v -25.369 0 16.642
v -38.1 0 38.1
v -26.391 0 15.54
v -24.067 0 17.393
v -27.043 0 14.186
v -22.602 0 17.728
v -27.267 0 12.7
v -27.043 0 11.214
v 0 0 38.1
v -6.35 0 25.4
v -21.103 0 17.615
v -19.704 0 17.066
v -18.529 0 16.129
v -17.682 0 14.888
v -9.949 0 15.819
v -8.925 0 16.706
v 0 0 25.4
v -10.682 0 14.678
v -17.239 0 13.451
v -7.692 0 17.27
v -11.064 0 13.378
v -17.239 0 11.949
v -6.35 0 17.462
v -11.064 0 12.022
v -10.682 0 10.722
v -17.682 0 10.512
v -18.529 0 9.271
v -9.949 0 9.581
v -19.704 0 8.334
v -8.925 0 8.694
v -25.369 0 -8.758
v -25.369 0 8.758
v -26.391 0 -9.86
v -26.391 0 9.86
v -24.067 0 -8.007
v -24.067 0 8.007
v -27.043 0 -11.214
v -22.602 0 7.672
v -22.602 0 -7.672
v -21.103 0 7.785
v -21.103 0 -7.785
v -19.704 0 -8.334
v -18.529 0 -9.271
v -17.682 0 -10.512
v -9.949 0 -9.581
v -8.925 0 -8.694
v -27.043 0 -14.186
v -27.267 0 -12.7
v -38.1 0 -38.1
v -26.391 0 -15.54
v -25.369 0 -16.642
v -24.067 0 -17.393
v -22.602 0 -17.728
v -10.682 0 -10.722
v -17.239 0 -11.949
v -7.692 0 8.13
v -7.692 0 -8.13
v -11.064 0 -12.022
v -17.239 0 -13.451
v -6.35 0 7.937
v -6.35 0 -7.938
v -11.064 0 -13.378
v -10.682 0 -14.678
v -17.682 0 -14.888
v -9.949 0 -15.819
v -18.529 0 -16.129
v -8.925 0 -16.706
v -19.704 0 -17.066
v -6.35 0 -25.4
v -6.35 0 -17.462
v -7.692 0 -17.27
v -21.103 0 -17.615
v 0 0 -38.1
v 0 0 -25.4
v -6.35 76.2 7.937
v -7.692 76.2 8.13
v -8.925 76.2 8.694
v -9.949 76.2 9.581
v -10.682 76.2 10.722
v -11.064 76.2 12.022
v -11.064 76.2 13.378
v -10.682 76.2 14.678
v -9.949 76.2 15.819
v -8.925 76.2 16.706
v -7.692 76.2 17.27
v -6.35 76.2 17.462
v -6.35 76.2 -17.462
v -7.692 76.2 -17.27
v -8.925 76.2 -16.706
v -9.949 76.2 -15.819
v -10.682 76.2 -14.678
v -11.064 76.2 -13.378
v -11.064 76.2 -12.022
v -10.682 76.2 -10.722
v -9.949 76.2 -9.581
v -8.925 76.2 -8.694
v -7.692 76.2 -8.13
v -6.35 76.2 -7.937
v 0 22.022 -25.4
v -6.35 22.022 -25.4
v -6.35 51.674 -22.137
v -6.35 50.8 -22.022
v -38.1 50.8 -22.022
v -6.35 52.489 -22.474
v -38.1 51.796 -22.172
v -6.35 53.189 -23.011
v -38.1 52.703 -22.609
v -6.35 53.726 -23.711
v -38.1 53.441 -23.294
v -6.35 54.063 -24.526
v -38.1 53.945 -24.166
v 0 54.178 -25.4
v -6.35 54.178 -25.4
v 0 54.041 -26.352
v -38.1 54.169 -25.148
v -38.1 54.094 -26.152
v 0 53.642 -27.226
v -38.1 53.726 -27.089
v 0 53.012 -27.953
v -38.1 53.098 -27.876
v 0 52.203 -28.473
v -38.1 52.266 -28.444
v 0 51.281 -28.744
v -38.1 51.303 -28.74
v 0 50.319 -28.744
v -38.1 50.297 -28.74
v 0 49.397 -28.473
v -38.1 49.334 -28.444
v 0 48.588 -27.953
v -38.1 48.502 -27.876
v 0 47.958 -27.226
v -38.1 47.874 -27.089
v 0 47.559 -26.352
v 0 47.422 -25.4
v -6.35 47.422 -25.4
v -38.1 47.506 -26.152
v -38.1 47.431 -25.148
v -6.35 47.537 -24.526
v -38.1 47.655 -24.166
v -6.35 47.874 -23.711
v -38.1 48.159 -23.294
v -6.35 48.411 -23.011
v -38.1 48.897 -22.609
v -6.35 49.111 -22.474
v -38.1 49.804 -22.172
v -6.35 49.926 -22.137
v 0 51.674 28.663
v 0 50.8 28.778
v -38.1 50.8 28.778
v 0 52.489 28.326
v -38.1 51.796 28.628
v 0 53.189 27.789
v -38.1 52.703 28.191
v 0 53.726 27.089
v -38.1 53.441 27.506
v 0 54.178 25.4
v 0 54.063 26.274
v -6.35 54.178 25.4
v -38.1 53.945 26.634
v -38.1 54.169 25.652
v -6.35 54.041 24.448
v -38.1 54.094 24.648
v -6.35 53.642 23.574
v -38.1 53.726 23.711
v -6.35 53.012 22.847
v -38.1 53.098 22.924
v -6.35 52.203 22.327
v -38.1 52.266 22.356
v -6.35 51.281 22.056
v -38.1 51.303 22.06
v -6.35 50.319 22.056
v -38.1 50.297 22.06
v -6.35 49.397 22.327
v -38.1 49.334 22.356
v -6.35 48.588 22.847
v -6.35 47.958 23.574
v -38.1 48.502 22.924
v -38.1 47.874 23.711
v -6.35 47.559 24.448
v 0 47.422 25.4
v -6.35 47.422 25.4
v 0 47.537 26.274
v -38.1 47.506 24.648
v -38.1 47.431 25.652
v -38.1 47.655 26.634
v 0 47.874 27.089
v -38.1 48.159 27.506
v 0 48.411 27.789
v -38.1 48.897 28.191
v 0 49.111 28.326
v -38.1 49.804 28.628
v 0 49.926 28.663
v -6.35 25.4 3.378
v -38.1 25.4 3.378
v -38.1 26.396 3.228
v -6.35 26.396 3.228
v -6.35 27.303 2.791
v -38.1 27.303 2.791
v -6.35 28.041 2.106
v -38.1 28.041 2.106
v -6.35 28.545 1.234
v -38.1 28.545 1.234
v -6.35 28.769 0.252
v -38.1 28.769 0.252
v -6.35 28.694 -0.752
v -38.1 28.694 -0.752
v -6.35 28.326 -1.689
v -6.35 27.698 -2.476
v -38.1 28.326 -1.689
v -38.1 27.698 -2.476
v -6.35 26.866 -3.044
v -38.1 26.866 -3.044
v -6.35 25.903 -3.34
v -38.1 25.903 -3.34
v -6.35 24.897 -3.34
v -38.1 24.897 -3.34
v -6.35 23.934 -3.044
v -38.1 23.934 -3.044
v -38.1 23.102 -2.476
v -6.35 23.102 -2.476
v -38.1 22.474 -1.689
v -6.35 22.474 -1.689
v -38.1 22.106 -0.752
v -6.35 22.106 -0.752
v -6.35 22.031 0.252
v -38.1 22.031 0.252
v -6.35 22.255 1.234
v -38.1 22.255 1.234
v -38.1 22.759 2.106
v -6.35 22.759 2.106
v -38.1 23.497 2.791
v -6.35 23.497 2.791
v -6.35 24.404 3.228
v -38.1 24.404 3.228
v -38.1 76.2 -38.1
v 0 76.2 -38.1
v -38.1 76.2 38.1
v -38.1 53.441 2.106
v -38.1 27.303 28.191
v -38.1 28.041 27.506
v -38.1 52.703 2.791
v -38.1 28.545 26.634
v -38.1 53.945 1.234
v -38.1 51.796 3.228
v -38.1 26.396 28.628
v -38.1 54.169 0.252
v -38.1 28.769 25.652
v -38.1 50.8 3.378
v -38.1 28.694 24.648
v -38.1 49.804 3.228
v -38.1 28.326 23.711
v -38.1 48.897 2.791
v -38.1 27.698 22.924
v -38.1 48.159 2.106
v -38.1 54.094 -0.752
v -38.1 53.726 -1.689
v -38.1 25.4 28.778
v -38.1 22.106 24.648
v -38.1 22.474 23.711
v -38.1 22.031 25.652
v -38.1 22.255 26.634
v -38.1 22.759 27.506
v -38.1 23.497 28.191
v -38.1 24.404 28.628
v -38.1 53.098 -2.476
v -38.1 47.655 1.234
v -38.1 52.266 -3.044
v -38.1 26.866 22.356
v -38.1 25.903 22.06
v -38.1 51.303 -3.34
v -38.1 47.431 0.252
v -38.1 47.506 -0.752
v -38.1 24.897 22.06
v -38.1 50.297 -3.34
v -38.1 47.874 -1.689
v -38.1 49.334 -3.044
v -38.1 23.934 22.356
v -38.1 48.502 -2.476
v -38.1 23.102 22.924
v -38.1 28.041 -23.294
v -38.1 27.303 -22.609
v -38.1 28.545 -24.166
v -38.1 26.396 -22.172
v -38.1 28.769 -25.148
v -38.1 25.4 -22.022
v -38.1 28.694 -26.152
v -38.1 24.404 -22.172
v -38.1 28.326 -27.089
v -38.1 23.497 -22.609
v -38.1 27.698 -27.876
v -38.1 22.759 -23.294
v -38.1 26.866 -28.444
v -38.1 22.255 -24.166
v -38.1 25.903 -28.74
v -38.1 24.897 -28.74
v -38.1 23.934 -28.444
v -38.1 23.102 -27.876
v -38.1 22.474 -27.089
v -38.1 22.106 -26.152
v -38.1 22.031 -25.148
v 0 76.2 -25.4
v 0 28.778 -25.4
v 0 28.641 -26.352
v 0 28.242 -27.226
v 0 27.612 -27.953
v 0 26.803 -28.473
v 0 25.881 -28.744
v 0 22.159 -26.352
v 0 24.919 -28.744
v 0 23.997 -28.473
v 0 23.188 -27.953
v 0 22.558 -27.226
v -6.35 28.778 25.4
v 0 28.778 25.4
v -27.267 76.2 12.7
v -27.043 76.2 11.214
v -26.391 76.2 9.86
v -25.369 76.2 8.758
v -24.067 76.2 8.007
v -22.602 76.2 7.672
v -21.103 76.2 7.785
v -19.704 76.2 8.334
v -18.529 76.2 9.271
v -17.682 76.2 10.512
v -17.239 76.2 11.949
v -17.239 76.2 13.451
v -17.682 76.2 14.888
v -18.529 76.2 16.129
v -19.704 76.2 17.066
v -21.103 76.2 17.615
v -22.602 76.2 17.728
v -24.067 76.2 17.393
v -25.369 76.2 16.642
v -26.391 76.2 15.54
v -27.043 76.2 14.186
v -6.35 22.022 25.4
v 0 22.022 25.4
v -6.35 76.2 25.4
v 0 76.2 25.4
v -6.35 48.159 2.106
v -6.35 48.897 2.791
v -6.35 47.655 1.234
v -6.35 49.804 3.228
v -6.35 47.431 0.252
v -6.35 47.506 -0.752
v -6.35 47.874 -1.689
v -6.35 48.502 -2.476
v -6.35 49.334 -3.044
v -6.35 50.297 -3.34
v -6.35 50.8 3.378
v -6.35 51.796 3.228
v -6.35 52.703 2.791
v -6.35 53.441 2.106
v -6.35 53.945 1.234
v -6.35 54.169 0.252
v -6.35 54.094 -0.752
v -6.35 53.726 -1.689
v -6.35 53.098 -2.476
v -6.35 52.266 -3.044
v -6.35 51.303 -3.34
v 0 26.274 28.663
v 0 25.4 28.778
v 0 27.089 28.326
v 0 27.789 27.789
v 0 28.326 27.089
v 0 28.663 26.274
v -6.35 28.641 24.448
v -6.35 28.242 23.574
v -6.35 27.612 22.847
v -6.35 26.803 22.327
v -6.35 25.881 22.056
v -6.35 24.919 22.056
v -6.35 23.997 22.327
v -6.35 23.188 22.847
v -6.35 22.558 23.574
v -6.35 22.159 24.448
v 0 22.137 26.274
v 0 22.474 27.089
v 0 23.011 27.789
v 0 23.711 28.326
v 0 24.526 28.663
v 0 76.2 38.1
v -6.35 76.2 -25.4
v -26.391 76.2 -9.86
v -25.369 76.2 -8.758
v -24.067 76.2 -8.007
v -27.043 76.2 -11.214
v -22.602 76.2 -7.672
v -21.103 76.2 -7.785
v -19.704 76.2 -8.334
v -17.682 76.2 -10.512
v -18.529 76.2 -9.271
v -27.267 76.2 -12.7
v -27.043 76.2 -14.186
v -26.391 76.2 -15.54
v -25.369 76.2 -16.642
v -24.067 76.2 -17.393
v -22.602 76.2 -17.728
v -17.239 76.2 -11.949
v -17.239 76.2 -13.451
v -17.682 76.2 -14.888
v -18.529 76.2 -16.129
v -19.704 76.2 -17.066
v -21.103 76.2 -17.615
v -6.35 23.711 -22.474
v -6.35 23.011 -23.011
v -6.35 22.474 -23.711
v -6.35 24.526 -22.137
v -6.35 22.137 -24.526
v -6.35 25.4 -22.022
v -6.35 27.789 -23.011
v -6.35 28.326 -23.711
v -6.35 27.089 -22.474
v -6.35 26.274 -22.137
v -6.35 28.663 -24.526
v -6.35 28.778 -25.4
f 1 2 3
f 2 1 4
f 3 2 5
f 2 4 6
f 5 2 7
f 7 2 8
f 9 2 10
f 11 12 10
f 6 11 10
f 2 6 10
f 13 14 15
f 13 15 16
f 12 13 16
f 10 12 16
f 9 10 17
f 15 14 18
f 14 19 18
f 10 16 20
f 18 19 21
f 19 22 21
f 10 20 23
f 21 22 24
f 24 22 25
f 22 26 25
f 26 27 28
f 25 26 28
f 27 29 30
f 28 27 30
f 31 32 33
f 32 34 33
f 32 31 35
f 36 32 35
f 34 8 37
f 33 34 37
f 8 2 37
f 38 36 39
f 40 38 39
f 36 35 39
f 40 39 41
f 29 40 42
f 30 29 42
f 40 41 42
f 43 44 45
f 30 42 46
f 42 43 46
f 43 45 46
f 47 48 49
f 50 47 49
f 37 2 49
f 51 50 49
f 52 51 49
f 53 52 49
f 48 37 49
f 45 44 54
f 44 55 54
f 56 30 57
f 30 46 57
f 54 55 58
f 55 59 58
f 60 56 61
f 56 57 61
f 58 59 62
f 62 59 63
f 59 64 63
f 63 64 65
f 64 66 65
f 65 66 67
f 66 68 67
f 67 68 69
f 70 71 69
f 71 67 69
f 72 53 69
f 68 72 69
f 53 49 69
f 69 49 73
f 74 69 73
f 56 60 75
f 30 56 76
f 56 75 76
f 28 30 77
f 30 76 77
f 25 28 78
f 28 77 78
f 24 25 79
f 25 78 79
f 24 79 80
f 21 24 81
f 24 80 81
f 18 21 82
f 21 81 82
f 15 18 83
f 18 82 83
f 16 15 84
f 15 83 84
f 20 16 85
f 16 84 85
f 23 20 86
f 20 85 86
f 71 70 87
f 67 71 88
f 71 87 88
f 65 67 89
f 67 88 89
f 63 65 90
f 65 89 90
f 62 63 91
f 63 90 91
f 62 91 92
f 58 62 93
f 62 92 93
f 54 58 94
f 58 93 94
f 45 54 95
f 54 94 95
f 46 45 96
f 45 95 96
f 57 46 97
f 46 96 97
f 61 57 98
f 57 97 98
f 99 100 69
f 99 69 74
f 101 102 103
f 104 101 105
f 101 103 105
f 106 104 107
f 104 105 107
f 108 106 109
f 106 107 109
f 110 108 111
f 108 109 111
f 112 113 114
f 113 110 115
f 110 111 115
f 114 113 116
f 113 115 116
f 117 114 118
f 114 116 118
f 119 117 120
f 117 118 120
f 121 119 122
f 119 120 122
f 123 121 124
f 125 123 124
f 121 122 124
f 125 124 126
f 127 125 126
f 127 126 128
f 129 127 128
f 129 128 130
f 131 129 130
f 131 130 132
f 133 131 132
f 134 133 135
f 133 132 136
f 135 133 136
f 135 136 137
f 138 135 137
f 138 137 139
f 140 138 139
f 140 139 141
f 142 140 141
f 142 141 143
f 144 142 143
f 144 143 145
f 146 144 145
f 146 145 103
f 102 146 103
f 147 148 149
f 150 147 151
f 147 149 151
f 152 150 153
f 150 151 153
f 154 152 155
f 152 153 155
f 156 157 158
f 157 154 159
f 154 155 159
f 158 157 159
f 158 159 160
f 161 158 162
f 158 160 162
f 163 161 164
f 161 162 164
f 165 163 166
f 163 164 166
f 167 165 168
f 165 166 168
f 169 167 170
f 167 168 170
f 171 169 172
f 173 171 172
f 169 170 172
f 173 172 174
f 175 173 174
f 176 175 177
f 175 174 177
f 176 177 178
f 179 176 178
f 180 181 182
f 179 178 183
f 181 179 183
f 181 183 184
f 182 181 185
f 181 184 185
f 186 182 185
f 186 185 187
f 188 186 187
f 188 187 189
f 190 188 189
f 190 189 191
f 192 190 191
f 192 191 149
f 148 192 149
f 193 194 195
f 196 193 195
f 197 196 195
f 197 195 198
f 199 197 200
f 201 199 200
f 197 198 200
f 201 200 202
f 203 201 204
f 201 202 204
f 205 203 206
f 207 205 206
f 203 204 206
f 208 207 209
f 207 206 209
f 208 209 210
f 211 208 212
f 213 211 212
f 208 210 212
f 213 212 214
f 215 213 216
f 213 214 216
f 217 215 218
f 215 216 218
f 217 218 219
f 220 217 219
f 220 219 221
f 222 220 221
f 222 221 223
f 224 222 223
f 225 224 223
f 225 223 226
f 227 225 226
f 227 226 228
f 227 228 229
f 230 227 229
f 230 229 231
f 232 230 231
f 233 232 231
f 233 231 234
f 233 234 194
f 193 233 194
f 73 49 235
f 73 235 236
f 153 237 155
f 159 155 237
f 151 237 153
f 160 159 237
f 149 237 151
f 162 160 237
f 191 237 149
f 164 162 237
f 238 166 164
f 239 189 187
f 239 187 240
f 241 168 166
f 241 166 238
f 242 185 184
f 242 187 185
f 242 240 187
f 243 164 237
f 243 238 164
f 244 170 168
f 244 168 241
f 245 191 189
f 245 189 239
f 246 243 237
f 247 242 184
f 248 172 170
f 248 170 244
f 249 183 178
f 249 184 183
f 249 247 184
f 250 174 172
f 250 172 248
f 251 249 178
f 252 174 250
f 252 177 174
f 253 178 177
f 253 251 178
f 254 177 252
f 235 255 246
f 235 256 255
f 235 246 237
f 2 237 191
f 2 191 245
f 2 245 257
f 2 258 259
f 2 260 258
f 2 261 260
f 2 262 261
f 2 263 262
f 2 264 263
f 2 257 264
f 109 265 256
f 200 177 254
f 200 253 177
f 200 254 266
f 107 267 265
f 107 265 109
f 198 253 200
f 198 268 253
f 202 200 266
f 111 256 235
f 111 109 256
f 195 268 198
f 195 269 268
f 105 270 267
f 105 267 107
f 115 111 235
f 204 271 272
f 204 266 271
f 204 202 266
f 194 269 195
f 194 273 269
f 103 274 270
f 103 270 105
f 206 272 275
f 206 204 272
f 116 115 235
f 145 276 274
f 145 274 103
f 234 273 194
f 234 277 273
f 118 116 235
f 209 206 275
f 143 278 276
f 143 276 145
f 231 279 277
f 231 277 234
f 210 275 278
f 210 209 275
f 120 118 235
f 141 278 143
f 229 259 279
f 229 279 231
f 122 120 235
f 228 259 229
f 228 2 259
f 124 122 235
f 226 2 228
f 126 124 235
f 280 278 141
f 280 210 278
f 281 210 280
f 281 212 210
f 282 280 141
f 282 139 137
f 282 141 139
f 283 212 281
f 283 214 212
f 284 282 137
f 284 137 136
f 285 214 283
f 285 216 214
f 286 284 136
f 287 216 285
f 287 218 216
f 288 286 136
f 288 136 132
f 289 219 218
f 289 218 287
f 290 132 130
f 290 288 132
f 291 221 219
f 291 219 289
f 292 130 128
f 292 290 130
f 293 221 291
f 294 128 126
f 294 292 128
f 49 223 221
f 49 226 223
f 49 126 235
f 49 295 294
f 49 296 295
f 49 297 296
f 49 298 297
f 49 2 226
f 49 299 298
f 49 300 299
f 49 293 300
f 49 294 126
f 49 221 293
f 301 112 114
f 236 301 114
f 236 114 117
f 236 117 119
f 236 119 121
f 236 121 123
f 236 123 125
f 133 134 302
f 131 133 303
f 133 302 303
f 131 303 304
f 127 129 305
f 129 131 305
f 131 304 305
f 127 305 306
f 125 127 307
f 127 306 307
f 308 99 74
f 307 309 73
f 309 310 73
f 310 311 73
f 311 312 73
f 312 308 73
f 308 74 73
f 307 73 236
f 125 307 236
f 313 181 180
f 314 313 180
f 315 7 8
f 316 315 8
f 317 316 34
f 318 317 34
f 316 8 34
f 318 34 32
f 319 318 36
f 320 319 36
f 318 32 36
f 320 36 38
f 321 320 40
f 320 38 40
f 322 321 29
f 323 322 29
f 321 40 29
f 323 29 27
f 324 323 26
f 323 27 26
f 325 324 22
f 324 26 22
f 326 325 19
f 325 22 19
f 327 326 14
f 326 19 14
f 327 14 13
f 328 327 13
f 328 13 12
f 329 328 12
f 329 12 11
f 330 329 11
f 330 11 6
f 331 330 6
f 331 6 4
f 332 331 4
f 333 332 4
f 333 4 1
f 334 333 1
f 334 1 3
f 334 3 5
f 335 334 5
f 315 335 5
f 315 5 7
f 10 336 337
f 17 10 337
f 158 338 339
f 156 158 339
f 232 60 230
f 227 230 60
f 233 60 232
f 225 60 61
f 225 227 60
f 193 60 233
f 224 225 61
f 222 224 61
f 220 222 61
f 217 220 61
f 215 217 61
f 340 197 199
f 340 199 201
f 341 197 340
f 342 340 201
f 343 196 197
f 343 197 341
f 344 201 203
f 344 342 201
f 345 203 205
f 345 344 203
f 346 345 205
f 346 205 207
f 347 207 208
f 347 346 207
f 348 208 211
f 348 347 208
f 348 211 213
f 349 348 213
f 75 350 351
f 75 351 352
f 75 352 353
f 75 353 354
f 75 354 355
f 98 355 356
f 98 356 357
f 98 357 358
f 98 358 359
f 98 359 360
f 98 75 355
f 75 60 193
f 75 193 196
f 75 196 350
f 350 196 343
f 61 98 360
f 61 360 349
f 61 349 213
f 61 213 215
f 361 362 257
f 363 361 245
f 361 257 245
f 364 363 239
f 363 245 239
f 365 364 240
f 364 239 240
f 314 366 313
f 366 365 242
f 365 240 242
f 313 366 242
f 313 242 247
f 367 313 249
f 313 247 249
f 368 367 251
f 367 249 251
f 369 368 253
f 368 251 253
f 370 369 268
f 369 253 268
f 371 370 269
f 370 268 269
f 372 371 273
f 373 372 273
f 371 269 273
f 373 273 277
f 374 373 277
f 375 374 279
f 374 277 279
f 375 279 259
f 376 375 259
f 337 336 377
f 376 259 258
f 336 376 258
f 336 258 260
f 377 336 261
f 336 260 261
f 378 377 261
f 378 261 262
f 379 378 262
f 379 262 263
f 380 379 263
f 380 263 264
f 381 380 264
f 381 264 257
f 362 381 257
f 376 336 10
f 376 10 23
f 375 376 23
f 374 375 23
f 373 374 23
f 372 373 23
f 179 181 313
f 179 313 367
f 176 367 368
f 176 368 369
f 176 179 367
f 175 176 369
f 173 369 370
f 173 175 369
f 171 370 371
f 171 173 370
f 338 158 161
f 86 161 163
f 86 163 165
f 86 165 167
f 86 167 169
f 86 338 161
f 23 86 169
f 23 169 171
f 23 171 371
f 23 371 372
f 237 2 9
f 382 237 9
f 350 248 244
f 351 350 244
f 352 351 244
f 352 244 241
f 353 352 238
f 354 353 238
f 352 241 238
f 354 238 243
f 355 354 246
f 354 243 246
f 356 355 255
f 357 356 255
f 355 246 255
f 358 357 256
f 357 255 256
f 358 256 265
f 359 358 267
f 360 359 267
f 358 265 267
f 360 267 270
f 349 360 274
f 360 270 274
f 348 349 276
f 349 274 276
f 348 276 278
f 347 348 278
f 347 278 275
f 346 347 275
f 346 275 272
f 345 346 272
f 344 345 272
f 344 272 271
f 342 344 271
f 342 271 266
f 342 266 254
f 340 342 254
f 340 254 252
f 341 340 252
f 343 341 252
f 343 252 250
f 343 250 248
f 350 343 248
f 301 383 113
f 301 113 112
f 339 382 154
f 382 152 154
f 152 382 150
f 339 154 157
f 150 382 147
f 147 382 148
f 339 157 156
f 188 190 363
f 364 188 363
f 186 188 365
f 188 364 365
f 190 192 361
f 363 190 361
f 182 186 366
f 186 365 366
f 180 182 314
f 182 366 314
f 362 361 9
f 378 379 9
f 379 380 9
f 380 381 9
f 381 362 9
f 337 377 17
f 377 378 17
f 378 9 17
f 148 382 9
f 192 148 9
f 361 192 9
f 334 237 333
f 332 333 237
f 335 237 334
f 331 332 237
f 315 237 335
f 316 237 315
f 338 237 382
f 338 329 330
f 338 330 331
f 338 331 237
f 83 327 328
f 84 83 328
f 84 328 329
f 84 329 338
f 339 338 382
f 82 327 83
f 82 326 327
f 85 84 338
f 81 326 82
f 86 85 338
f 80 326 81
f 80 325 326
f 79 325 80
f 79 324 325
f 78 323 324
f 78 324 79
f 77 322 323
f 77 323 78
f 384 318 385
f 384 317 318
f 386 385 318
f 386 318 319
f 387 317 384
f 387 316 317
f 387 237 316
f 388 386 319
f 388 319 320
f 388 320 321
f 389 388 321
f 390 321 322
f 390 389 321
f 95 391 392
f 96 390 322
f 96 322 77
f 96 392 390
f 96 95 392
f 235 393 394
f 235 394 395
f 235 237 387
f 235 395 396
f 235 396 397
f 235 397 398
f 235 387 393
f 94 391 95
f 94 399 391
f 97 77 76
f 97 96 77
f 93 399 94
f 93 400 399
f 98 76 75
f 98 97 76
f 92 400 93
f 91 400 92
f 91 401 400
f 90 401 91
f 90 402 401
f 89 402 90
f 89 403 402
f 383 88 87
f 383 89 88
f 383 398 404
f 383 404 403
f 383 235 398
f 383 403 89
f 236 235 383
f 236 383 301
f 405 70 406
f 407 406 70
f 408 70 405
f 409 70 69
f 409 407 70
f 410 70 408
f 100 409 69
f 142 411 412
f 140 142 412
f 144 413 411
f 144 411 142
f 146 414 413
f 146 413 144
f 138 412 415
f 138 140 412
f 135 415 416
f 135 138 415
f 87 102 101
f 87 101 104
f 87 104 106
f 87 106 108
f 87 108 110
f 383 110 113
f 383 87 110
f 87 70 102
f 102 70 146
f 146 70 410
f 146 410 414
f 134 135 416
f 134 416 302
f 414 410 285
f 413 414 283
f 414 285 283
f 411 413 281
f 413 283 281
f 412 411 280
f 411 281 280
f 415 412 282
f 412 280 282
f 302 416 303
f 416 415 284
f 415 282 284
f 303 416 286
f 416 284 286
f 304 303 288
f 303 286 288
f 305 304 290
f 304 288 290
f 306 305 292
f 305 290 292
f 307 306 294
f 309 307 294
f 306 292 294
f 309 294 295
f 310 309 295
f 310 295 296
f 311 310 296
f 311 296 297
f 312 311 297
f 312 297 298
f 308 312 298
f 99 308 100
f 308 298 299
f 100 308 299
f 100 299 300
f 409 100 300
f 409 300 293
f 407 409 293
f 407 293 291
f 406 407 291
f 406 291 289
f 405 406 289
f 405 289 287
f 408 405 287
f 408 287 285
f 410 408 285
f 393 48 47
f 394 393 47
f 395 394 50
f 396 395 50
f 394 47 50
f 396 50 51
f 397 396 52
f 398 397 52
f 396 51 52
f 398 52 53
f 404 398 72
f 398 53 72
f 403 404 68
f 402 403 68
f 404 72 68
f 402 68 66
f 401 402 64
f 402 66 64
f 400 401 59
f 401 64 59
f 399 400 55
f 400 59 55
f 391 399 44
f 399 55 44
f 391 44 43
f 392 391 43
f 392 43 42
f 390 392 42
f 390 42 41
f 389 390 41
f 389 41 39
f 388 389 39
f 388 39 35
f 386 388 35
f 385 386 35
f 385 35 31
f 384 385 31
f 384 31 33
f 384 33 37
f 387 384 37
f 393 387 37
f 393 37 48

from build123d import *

# Parameters (mm, degrees)
SKETCH1_W               = 38.1
SKETCH1_H               = 76.2
BOSS_EXTRUDE1_DEPTH     = 76.2
SKETCH2_W               = 6.35
SKETCH2_H               = 50.8
CUT_EXTRUDE1_DEPTH      = 94.3255592
F_1_4_CLEARANCE_HOLE1_D = 6.7564
F_3_8_CLEARANCE_HOLE1_D = 10.0838
SKETCH7_R               = 4.7625
CUT_EXTRUDE2_DEPTH      = 94.3255592


with BuildPart() as part:
    # Sketch1 → Boss-Extrude1 (new body)
    with BuildSketch(Plane(origin=(0, 0, 0), x_dir=(1, 0, 0), z_dir=(0, 1, 0))):
        with Locations((-19.05, 0)):
            Rectangle(SKETCH1_W, SKETCH1_H)
    extrude(amount=BOSS_EXTRUDE1_DEPTH)

    # Sketch2 → Cut-Extrude1 (cut, through all)
    with BuildSketch(Plane(origin=(0, 76.2, 0), x_dir=(1, 0, 0), z_dir=(0, 1, 0))):
        with Locations((-3.175, 0)):
            Rectangle(SKETCH2_W, SKETCH2_H)
    extrude(amount=-CUT_EXTRUDE1_DEPTH, mode=Mode.SUBTRACT)

    # 1/4 Clearance Hole1 (through all)
    with Locations(Plane(origin=(0, 0, 0), x_dir=(0, 0, -1), z_dir=(1, 0, 0))):
        with Locations((0, 50.8), (0, 25.4), (-25.4, 25.4), (-25.4, 50.8), (25.4, 50.8), (25.4, 25.4)):
            Hole(F_1_4_CLEARANCE_HOLE1_D / 2)

    # 3/8 Clearance Hole1 (through all)
    with Locations(Plane(origin=(0, 76.2, 0), x_dir=(1, 0, 0), z_dir=(0, 1, 0))):
        with Locations((-22.225, -12.7), (-22.225, 12.7)):
            Hole(F_3_8_CLEARANCE_HOLE1_D / 2)

    # Sketch7 → Cut-Extrude2 (cut, through all)
    with BuildSketch(Plane(origin=(0, 76.2, 0), x_dir=(1, 0, 0), z_dir=(0, 1, 0))):
        with Locations((-6.35, 12.7)):
            Circle(SKETCH7_R)
        with Locations((-6.35, -12.7)):
            Circle(SKETCH7_R)
    extrude(amount=-CUT_EXTRUDE2_DEPTH, mode=Mode.SUBTRACT)


solid = part.part
